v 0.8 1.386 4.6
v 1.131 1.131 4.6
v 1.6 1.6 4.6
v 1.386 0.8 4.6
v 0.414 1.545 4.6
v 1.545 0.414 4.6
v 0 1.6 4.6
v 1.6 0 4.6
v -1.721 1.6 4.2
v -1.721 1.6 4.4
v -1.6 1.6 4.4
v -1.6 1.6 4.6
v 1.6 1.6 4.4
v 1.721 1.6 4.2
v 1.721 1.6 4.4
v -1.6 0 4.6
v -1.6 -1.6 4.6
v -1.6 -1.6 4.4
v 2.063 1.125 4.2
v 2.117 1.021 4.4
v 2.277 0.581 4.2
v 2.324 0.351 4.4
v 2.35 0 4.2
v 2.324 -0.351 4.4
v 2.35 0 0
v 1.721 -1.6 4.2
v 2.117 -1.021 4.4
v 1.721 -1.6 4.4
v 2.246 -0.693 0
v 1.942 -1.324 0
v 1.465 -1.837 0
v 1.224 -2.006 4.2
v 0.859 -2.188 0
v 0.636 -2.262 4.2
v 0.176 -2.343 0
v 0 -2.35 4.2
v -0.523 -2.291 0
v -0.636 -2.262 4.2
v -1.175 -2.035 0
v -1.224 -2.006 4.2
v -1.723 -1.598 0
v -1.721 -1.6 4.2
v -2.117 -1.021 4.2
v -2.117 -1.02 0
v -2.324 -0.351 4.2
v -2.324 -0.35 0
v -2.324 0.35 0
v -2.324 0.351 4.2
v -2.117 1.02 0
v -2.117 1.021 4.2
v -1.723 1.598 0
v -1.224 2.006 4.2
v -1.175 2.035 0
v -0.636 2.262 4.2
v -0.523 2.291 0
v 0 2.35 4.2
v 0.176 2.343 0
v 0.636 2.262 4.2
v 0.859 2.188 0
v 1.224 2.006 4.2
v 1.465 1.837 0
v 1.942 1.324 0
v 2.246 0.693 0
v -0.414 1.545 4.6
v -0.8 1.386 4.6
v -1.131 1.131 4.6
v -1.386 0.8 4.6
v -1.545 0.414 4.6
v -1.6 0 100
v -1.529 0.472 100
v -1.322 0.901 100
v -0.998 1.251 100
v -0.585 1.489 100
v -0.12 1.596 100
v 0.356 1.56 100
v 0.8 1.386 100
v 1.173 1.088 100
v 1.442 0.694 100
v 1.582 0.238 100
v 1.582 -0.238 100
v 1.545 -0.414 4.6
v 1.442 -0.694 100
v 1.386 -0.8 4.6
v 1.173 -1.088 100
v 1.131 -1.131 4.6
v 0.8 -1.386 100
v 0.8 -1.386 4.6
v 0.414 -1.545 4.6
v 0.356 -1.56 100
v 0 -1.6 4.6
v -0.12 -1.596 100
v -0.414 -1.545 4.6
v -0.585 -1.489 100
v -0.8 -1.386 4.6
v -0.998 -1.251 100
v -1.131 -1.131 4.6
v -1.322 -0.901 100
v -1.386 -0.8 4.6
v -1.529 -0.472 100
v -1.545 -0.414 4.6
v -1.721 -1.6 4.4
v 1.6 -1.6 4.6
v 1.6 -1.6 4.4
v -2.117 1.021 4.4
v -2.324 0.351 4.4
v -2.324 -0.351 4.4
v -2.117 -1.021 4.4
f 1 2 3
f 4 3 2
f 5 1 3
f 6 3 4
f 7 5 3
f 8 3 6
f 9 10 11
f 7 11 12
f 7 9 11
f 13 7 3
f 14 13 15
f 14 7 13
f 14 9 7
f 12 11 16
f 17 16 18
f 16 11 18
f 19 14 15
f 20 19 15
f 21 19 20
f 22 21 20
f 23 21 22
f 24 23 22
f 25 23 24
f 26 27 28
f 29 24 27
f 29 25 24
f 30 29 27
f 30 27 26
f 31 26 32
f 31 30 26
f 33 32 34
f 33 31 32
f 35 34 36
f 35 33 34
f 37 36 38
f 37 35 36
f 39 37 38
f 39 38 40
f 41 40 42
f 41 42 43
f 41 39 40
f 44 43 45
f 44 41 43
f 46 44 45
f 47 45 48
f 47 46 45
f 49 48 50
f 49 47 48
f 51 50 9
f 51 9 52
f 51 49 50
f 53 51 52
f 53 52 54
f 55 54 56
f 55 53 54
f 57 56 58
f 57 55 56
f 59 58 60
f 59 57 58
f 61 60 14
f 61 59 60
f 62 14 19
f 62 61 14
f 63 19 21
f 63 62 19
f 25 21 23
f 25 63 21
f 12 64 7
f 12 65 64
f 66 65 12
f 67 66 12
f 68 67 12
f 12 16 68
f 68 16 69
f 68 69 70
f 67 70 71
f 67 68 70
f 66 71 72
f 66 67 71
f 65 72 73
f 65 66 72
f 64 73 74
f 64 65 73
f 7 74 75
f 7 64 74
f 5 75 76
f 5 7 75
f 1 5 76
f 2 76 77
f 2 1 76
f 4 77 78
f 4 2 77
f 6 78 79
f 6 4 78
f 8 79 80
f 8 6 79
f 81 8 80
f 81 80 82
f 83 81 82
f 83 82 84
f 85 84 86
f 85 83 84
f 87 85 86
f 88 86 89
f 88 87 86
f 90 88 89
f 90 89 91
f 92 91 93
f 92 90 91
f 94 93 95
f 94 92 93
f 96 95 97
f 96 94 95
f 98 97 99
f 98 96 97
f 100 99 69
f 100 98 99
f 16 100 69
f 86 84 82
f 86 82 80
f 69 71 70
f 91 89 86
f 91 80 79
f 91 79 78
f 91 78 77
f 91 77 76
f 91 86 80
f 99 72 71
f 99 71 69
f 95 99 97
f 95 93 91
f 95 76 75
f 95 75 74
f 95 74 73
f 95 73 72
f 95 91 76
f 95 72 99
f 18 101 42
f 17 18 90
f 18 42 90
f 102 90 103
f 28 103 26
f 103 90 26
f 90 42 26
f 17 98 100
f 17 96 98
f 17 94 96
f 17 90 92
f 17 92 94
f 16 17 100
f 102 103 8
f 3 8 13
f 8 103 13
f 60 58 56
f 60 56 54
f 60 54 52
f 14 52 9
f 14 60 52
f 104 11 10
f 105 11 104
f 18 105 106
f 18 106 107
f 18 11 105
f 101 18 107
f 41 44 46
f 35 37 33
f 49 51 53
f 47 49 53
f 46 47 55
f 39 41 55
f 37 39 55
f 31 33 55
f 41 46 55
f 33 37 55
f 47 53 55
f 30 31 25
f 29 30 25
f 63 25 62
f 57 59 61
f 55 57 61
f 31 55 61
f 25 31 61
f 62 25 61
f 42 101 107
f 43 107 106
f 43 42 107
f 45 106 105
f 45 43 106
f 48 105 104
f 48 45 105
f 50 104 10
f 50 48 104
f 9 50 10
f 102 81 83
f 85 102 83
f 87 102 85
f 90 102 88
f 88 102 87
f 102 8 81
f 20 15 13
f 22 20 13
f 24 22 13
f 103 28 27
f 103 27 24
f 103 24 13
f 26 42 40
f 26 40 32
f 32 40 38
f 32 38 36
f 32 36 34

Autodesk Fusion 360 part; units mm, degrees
sketch "Sketch1" plane through (0, 0, 0) normal (0, 0, 1) x (1, 0, 0)
  circle A0 centre (0, 0) radius 2.35
  dimension "d1" = 4.7
extrude "Extrude1" add sketch "Sketch1" along normal blind 4.2
sketch "Sketch2" plane through (0, 0, 4.2) normal (0, 0, 1) x (-1, 0, 0)
  circle A0 centre (0, 0) radius 2.35
  circle A1 centre (0, 0) radius 1.6
  dimension "d4" = 3.2
extrude "Extrude2" add sketch "Sketch2" along normal blind 100 from surface at -4.2 contours A1
sketch "Sketch3" plane through (0, 0, 4.2) normal (0, 0, 1) x (-1, 0, 0)
  circle A0 centre (0, 0) radius 1.6
  circle A1 centre (0, 0) radius 2.35
  line L0 (1.7212, -1.6) -> (-1.7212, -1.6)
  line L1 (1.7212, 1.6) -> (-1.7212, 1.6)
extrude "Extrude3" add sketch "Sketch3" along normal blind 0.2 contours A0 A1 L0 L1 | A0 A1 L0 L1
sketch "Sketch4" plane through (0, 0, 4.4) normal (0, 0, 1) x (-1, 0, 0)
  arc A0 (1.7212, -1.6) -> (1.7212, 1.6) centre (0, 0) ccw
  line L0 (1.7212, 1.6) -> (0, 1.6)
  arc A1 (0, -1.6) -> (0, 1.6) centre (0, 0) ccw
  line L1 (0, -1.6) -> (1.7212, -1.6)
  line L2 (0, 1.6) -> (-1.7212, 1.6)
  arc A2 (-1.7212, 1.6) -> (-1.7212, -1.6) centre (0, 0) ccw
  line L3 (-1.7212, -1.6) -> (0, -1.6)
  arc A3 (0, 1.6) -> (0, -1.6) centre (0, 0) ccw
  line L4 (1.6, -1.6) -> (1.6, 1.6)
  line L5 (-1.6, 1.6) -> (-1.6, -1.6)
extrude "Extrude4" add sketch "Sketch4" along normal blind 0.2 contours A1 L1 L4 | L0 A1 L4 | L3 A3 L5 | L2 A3 L5
